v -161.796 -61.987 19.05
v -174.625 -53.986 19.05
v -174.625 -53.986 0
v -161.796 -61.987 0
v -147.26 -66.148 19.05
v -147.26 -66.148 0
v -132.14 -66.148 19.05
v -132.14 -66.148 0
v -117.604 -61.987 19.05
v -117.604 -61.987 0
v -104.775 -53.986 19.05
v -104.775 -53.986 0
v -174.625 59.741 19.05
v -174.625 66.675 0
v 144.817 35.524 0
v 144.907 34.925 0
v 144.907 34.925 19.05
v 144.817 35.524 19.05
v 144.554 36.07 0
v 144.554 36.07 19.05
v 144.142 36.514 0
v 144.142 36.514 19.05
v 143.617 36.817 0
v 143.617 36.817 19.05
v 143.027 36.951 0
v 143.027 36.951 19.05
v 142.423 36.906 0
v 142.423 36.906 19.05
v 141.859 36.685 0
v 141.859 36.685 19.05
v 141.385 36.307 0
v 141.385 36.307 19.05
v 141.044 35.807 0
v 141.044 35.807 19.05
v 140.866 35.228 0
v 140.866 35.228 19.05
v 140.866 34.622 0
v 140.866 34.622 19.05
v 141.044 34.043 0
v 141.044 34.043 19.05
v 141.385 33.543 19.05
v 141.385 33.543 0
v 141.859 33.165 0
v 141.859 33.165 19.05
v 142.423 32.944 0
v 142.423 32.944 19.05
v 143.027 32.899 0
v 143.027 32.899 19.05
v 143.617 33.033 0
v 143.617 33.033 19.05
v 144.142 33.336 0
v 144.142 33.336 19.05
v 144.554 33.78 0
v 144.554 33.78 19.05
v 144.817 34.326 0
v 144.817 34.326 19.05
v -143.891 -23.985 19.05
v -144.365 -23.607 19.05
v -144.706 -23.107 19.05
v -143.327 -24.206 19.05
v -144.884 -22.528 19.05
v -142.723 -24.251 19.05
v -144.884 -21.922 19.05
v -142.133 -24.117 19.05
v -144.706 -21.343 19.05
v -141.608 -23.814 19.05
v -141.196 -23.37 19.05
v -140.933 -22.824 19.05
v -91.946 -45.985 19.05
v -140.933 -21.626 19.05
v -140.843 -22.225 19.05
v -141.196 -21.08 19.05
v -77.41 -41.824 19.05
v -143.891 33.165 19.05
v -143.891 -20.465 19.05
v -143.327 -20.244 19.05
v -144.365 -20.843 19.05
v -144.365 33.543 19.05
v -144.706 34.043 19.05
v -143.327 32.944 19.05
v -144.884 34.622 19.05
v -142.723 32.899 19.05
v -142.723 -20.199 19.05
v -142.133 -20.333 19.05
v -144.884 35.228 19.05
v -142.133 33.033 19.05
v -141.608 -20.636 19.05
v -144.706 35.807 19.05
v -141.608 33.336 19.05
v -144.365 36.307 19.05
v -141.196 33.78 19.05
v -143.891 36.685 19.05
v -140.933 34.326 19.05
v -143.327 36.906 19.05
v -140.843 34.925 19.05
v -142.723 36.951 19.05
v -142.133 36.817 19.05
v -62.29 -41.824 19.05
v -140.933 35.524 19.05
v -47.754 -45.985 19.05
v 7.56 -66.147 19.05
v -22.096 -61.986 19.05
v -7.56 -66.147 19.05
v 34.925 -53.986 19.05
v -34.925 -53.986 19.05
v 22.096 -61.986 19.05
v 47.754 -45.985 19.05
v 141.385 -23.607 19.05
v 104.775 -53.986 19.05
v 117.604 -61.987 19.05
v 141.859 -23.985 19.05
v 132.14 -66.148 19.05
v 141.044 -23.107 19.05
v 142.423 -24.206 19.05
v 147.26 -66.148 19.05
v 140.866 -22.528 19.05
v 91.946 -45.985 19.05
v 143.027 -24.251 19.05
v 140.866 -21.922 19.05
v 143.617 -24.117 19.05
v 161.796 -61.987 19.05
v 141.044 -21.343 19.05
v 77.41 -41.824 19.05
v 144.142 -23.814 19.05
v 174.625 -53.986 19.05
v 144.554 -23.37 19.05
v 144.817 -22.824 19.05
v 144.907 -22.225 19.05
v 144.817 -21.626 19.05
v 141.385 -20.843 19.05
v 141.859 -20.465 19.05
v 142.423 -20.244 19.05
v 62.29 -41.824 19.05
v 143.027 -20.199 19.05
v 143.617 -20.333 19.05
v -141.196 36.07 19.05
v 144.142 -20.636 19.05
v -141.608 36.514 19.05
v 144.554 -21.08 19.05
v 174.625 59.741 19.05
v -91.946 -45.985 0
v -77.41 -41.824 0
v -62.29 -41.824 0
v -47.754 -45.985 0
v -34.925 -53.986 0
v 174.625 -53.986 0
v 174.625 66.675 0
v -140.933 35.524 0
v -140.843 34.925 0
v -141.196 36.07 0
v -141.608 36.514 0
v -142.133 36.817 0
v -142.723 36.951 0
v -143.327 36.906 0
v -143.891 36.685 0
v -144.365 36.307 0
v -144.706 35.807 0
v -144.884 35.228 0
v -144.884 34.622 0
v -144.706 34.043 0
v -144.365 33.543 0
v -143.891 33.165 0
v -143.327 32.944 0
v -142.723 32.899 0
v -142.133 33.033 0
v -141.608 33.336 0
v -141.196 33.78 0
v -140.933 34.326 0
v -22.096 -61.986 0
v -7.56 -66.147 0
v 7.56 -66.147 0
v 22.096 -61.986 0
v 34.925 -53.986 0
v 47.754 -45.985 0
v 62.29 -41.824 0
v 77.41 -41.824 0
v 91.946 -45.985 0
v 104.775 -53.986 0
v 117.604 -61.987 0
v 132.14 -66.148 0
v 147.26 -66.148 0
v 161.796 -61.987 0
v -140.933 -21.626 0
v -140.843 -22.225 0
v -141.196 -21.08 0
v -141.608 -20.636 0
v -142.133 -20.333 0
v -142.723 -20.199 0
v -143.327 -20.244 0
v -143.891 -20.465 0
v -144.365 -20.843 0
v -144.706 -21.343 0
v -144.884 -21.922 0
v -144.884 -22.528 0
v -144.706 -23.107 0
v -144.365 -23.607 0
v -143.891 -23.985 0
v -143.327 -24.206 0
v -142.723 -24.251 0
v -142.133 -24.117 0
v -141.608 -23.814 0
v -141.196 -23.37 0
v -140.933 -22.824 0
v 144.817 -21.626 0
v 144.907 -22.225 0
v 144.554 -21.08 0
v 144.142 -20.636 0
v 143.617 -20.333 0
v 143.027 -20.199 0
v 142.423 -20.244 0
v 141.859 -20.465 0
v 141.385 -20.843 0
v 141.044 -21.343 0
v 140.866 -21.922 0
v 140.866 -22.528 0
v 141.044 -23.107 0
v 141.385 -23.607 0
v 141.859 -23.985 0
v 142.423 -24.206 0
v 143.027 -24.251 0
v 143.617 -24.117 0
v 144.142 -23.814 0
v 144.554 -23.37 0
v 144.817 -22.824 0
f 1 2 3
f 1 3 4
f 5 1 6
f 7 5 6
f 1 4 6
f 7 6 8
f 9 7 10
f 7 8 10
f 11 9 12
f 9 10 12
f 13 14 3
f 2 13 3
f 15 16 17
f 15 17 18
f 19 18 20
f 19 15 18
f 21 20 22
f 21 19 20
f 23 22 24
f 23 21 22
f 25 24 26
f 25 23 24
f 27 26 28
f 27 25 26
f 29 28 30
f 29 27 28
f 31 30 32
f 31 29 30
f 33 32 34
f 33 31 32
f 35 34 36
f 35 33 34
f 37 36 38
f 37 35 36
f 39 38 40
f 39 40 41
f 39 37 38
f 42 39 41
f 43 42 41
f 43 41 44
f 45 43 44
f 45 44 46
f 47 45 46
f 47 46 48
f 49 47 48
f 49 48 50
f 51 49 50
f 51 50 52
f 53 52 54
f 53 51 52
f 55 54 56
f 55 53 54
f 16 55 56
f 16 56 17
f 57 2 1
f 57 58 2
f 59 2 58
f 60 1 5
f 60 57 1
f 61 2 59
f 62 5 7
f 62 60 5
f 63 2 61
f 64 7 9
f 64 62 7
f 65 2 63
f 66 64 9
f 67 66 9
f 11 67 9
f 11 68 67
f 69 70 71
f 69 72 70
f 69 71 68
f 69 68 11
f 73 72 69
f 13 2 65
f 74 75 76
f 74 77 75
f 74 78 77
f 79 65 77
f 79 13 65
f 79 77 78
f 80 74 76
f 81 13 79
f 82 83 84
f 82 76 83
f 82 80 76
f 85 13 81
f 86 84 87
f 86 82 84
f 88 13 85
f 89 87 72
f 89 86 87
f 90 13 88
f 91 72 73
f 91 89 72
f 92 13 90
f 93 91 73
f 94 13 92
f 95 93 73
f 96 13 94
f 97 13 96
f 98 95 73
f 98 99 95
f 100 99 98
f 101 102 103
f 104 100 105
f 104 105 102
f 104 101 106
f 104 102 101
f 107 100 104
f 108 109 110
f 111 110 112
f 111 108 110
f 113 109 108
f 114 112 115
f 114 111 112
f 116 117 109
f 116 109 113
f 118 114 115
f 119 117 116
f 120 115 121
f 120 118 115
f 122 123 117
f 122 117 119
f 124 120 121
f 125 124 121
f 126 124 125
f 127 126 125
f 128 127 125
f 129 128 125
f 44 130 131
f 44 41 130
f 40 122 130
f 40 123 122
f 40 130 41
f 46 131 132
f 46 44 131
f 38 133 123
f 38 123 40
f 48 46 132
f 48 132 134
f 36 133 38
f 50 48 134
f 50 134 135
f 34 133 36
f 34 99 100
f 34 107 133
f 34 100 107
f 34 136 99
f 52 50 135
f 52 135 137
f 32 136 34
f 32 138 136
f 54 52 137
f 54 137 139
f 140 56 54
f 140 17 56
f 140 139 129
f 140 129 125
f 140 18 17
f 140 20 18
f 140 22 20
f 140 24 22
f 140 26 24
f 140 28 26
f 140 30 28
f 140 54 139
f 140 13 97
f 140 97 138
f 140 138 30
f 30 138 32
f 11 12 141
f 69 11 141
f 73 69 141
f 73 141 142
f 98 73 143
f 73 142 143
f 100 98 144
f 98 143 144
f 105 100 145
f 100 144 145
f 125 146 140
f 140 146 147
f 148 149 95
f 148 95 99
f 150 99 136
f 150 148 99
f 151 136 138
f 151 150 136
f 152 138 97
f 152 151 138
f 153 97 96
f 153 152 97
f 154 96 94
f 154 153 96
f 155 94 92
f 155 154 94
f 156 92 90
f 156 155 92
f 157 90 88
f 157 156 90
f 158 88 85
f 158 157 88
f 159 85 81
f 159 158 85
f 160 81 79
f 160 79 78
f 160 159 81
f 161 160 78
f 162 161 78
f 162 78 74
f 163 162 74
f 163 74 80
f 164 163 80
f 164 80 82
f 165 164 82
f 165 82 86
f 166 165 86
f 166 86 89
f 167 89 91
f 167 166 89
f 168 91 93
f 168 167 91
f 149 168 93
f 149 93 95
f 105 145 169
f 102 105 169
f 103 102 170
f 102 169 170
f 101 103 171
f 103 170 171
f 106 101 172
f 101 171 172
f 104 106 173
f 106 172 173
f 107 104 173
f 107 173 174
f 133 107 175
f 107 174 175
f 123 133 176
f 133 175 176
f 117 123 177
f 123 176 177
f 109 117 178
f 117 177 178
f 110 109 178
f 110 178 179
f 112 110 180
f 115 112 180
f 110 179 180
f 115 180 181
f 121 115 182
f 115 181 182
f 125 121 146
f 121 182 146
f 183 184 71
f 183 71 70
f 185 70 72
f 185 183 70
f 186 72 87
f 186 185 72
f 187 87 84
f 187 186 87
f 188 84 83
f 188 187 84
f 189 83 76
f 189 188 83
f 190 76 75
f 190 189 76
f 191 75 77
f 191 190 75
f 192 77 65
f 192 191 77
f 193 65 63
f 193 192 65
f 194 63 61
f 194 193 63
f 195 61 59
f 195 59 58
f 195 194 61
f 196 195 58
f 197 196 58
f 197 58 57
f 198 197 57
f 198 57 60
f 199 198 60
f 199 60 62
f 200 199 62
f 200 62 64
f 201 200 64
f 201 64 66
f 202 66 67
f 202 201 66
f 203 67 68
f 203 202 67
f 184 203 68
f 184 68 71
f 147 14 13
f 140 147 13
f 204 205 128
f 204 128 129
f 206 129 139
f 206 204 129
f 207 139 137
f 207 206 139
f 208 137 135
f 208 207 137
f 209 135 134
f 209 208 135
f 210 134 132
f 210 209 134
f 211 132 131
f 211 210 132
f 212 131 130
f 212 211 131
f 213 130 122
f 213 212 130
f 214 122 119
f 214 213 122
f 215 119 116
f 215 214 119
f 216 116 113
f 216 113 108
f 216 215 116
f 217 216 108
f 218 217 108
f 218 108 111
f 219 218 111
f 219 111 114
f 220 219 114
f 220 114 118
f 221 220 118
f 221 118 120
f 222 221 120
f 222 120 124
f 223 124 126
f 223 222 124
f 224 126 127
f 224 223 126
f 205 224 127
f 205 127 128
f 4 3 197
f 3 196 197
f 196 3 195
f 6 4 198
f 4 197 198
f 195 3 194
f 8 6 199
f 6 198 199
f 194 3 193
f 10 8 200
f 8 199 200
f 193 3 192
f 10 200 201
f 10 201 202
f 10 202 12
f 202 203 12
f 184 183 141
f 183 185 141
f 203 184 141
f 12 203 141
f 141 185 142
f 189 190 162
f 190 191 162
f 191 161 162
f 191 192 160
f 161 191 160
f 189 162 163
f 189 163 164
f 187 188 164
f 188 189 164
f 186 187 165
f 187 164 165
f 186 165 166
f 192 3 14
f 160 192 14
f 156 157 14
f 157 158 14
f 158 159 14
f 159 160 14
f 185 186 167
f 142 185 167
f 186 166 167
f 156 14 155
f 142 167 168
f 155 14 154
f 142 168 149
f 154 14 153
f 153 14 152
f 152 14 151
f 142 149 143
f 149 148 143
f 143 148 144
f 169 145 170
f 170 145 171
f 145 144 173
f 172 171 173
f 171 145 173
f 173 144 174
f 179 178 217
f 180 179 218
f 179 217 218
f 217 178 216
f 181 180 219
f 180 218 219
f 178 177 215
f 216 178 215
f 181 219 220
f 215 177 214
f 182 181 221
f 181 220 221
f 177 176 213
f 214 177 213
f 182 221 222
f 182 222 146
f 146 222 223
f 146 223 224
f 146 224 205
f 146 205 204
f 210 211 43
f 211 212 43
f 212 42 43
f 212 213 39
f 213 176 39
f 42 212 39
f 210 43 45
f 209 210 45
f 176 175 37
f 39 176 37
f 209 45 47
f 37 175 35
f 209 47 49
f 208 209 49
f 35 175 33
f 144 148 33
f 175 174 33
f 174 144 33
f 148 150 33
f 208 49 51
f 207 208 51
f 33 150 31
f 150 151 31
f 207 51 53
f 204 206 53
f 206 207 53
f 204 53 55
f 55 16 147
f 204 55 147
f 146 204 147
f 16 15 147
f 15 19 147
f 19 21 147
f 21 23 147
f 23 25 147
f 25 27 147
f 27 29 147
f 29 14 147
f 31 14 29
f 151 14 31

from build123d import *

# Parameters (mm, degrees)
F0_R     = 2.032
F1_DEPTH = 19.05
F3_DEPTH = 349.25


with BuildPart() as f1:
    # F0 (on Top) → F1 (new body)
    with BuildSketch(Plane.XY):
        with BuildLine():
            Line((174.625, -53.986043), (174.625, 66.675))
            Line((174.625, 66.675), (-174.625, 66.675))
            Line((-174.625, 66.675), (-174.625, -53.986043))
            ThreePointArc((-174.625, -53.986043), (-139.7, -66.67541), (-104.775, -53.986043))
            ThreePointArc((-104.775, -53.986043), (-69.85, -41.296677), (-34.925, -53.986043))
            ThreePointArc((-34.925, -53.986043), (0, -66.675), (34.925, -53.986043))
            ThreePointArc((34.925, -53.986043), (69.85, -41.296677), (104.775, -53.986043))
            ThreePointArc((104.775, -53.986043), (139.7, -66.67541), (174.625, -53.986043))
        make_face()
        with Locations((-142.875, -22.225)):
            Circle(F0_R, mode=Mode.SUBTRACT)
        with Locations((142.875, -22.225)):
            Circle(F0_R, mode=Mode.SUBTRACT)
        with Locations((-142.875, 34.925)):
            Circle(F0_R, mode=Mode.SUBTRACT)
        with Locations((142.875, 34.925)):
            Circle(F0_R, mode=Mode.SUBTRACT)
    extrude(amount=F1_DEPTH)

    # F2 (on face) → F3 (cut)
    with BuildSketch(Plane(origin=(-174.625, 0, 0), x_dir=(0, -1, 0), z_dir=(-1, 0, 0))):
        Polygon((-59.741367, 19.05), (-66.675, 19.05), (-66.675, 0), align=None)
    extrude(amount=-F3_DEPTH, mode=Mode.SUBTRACT)


solid = f1.part
